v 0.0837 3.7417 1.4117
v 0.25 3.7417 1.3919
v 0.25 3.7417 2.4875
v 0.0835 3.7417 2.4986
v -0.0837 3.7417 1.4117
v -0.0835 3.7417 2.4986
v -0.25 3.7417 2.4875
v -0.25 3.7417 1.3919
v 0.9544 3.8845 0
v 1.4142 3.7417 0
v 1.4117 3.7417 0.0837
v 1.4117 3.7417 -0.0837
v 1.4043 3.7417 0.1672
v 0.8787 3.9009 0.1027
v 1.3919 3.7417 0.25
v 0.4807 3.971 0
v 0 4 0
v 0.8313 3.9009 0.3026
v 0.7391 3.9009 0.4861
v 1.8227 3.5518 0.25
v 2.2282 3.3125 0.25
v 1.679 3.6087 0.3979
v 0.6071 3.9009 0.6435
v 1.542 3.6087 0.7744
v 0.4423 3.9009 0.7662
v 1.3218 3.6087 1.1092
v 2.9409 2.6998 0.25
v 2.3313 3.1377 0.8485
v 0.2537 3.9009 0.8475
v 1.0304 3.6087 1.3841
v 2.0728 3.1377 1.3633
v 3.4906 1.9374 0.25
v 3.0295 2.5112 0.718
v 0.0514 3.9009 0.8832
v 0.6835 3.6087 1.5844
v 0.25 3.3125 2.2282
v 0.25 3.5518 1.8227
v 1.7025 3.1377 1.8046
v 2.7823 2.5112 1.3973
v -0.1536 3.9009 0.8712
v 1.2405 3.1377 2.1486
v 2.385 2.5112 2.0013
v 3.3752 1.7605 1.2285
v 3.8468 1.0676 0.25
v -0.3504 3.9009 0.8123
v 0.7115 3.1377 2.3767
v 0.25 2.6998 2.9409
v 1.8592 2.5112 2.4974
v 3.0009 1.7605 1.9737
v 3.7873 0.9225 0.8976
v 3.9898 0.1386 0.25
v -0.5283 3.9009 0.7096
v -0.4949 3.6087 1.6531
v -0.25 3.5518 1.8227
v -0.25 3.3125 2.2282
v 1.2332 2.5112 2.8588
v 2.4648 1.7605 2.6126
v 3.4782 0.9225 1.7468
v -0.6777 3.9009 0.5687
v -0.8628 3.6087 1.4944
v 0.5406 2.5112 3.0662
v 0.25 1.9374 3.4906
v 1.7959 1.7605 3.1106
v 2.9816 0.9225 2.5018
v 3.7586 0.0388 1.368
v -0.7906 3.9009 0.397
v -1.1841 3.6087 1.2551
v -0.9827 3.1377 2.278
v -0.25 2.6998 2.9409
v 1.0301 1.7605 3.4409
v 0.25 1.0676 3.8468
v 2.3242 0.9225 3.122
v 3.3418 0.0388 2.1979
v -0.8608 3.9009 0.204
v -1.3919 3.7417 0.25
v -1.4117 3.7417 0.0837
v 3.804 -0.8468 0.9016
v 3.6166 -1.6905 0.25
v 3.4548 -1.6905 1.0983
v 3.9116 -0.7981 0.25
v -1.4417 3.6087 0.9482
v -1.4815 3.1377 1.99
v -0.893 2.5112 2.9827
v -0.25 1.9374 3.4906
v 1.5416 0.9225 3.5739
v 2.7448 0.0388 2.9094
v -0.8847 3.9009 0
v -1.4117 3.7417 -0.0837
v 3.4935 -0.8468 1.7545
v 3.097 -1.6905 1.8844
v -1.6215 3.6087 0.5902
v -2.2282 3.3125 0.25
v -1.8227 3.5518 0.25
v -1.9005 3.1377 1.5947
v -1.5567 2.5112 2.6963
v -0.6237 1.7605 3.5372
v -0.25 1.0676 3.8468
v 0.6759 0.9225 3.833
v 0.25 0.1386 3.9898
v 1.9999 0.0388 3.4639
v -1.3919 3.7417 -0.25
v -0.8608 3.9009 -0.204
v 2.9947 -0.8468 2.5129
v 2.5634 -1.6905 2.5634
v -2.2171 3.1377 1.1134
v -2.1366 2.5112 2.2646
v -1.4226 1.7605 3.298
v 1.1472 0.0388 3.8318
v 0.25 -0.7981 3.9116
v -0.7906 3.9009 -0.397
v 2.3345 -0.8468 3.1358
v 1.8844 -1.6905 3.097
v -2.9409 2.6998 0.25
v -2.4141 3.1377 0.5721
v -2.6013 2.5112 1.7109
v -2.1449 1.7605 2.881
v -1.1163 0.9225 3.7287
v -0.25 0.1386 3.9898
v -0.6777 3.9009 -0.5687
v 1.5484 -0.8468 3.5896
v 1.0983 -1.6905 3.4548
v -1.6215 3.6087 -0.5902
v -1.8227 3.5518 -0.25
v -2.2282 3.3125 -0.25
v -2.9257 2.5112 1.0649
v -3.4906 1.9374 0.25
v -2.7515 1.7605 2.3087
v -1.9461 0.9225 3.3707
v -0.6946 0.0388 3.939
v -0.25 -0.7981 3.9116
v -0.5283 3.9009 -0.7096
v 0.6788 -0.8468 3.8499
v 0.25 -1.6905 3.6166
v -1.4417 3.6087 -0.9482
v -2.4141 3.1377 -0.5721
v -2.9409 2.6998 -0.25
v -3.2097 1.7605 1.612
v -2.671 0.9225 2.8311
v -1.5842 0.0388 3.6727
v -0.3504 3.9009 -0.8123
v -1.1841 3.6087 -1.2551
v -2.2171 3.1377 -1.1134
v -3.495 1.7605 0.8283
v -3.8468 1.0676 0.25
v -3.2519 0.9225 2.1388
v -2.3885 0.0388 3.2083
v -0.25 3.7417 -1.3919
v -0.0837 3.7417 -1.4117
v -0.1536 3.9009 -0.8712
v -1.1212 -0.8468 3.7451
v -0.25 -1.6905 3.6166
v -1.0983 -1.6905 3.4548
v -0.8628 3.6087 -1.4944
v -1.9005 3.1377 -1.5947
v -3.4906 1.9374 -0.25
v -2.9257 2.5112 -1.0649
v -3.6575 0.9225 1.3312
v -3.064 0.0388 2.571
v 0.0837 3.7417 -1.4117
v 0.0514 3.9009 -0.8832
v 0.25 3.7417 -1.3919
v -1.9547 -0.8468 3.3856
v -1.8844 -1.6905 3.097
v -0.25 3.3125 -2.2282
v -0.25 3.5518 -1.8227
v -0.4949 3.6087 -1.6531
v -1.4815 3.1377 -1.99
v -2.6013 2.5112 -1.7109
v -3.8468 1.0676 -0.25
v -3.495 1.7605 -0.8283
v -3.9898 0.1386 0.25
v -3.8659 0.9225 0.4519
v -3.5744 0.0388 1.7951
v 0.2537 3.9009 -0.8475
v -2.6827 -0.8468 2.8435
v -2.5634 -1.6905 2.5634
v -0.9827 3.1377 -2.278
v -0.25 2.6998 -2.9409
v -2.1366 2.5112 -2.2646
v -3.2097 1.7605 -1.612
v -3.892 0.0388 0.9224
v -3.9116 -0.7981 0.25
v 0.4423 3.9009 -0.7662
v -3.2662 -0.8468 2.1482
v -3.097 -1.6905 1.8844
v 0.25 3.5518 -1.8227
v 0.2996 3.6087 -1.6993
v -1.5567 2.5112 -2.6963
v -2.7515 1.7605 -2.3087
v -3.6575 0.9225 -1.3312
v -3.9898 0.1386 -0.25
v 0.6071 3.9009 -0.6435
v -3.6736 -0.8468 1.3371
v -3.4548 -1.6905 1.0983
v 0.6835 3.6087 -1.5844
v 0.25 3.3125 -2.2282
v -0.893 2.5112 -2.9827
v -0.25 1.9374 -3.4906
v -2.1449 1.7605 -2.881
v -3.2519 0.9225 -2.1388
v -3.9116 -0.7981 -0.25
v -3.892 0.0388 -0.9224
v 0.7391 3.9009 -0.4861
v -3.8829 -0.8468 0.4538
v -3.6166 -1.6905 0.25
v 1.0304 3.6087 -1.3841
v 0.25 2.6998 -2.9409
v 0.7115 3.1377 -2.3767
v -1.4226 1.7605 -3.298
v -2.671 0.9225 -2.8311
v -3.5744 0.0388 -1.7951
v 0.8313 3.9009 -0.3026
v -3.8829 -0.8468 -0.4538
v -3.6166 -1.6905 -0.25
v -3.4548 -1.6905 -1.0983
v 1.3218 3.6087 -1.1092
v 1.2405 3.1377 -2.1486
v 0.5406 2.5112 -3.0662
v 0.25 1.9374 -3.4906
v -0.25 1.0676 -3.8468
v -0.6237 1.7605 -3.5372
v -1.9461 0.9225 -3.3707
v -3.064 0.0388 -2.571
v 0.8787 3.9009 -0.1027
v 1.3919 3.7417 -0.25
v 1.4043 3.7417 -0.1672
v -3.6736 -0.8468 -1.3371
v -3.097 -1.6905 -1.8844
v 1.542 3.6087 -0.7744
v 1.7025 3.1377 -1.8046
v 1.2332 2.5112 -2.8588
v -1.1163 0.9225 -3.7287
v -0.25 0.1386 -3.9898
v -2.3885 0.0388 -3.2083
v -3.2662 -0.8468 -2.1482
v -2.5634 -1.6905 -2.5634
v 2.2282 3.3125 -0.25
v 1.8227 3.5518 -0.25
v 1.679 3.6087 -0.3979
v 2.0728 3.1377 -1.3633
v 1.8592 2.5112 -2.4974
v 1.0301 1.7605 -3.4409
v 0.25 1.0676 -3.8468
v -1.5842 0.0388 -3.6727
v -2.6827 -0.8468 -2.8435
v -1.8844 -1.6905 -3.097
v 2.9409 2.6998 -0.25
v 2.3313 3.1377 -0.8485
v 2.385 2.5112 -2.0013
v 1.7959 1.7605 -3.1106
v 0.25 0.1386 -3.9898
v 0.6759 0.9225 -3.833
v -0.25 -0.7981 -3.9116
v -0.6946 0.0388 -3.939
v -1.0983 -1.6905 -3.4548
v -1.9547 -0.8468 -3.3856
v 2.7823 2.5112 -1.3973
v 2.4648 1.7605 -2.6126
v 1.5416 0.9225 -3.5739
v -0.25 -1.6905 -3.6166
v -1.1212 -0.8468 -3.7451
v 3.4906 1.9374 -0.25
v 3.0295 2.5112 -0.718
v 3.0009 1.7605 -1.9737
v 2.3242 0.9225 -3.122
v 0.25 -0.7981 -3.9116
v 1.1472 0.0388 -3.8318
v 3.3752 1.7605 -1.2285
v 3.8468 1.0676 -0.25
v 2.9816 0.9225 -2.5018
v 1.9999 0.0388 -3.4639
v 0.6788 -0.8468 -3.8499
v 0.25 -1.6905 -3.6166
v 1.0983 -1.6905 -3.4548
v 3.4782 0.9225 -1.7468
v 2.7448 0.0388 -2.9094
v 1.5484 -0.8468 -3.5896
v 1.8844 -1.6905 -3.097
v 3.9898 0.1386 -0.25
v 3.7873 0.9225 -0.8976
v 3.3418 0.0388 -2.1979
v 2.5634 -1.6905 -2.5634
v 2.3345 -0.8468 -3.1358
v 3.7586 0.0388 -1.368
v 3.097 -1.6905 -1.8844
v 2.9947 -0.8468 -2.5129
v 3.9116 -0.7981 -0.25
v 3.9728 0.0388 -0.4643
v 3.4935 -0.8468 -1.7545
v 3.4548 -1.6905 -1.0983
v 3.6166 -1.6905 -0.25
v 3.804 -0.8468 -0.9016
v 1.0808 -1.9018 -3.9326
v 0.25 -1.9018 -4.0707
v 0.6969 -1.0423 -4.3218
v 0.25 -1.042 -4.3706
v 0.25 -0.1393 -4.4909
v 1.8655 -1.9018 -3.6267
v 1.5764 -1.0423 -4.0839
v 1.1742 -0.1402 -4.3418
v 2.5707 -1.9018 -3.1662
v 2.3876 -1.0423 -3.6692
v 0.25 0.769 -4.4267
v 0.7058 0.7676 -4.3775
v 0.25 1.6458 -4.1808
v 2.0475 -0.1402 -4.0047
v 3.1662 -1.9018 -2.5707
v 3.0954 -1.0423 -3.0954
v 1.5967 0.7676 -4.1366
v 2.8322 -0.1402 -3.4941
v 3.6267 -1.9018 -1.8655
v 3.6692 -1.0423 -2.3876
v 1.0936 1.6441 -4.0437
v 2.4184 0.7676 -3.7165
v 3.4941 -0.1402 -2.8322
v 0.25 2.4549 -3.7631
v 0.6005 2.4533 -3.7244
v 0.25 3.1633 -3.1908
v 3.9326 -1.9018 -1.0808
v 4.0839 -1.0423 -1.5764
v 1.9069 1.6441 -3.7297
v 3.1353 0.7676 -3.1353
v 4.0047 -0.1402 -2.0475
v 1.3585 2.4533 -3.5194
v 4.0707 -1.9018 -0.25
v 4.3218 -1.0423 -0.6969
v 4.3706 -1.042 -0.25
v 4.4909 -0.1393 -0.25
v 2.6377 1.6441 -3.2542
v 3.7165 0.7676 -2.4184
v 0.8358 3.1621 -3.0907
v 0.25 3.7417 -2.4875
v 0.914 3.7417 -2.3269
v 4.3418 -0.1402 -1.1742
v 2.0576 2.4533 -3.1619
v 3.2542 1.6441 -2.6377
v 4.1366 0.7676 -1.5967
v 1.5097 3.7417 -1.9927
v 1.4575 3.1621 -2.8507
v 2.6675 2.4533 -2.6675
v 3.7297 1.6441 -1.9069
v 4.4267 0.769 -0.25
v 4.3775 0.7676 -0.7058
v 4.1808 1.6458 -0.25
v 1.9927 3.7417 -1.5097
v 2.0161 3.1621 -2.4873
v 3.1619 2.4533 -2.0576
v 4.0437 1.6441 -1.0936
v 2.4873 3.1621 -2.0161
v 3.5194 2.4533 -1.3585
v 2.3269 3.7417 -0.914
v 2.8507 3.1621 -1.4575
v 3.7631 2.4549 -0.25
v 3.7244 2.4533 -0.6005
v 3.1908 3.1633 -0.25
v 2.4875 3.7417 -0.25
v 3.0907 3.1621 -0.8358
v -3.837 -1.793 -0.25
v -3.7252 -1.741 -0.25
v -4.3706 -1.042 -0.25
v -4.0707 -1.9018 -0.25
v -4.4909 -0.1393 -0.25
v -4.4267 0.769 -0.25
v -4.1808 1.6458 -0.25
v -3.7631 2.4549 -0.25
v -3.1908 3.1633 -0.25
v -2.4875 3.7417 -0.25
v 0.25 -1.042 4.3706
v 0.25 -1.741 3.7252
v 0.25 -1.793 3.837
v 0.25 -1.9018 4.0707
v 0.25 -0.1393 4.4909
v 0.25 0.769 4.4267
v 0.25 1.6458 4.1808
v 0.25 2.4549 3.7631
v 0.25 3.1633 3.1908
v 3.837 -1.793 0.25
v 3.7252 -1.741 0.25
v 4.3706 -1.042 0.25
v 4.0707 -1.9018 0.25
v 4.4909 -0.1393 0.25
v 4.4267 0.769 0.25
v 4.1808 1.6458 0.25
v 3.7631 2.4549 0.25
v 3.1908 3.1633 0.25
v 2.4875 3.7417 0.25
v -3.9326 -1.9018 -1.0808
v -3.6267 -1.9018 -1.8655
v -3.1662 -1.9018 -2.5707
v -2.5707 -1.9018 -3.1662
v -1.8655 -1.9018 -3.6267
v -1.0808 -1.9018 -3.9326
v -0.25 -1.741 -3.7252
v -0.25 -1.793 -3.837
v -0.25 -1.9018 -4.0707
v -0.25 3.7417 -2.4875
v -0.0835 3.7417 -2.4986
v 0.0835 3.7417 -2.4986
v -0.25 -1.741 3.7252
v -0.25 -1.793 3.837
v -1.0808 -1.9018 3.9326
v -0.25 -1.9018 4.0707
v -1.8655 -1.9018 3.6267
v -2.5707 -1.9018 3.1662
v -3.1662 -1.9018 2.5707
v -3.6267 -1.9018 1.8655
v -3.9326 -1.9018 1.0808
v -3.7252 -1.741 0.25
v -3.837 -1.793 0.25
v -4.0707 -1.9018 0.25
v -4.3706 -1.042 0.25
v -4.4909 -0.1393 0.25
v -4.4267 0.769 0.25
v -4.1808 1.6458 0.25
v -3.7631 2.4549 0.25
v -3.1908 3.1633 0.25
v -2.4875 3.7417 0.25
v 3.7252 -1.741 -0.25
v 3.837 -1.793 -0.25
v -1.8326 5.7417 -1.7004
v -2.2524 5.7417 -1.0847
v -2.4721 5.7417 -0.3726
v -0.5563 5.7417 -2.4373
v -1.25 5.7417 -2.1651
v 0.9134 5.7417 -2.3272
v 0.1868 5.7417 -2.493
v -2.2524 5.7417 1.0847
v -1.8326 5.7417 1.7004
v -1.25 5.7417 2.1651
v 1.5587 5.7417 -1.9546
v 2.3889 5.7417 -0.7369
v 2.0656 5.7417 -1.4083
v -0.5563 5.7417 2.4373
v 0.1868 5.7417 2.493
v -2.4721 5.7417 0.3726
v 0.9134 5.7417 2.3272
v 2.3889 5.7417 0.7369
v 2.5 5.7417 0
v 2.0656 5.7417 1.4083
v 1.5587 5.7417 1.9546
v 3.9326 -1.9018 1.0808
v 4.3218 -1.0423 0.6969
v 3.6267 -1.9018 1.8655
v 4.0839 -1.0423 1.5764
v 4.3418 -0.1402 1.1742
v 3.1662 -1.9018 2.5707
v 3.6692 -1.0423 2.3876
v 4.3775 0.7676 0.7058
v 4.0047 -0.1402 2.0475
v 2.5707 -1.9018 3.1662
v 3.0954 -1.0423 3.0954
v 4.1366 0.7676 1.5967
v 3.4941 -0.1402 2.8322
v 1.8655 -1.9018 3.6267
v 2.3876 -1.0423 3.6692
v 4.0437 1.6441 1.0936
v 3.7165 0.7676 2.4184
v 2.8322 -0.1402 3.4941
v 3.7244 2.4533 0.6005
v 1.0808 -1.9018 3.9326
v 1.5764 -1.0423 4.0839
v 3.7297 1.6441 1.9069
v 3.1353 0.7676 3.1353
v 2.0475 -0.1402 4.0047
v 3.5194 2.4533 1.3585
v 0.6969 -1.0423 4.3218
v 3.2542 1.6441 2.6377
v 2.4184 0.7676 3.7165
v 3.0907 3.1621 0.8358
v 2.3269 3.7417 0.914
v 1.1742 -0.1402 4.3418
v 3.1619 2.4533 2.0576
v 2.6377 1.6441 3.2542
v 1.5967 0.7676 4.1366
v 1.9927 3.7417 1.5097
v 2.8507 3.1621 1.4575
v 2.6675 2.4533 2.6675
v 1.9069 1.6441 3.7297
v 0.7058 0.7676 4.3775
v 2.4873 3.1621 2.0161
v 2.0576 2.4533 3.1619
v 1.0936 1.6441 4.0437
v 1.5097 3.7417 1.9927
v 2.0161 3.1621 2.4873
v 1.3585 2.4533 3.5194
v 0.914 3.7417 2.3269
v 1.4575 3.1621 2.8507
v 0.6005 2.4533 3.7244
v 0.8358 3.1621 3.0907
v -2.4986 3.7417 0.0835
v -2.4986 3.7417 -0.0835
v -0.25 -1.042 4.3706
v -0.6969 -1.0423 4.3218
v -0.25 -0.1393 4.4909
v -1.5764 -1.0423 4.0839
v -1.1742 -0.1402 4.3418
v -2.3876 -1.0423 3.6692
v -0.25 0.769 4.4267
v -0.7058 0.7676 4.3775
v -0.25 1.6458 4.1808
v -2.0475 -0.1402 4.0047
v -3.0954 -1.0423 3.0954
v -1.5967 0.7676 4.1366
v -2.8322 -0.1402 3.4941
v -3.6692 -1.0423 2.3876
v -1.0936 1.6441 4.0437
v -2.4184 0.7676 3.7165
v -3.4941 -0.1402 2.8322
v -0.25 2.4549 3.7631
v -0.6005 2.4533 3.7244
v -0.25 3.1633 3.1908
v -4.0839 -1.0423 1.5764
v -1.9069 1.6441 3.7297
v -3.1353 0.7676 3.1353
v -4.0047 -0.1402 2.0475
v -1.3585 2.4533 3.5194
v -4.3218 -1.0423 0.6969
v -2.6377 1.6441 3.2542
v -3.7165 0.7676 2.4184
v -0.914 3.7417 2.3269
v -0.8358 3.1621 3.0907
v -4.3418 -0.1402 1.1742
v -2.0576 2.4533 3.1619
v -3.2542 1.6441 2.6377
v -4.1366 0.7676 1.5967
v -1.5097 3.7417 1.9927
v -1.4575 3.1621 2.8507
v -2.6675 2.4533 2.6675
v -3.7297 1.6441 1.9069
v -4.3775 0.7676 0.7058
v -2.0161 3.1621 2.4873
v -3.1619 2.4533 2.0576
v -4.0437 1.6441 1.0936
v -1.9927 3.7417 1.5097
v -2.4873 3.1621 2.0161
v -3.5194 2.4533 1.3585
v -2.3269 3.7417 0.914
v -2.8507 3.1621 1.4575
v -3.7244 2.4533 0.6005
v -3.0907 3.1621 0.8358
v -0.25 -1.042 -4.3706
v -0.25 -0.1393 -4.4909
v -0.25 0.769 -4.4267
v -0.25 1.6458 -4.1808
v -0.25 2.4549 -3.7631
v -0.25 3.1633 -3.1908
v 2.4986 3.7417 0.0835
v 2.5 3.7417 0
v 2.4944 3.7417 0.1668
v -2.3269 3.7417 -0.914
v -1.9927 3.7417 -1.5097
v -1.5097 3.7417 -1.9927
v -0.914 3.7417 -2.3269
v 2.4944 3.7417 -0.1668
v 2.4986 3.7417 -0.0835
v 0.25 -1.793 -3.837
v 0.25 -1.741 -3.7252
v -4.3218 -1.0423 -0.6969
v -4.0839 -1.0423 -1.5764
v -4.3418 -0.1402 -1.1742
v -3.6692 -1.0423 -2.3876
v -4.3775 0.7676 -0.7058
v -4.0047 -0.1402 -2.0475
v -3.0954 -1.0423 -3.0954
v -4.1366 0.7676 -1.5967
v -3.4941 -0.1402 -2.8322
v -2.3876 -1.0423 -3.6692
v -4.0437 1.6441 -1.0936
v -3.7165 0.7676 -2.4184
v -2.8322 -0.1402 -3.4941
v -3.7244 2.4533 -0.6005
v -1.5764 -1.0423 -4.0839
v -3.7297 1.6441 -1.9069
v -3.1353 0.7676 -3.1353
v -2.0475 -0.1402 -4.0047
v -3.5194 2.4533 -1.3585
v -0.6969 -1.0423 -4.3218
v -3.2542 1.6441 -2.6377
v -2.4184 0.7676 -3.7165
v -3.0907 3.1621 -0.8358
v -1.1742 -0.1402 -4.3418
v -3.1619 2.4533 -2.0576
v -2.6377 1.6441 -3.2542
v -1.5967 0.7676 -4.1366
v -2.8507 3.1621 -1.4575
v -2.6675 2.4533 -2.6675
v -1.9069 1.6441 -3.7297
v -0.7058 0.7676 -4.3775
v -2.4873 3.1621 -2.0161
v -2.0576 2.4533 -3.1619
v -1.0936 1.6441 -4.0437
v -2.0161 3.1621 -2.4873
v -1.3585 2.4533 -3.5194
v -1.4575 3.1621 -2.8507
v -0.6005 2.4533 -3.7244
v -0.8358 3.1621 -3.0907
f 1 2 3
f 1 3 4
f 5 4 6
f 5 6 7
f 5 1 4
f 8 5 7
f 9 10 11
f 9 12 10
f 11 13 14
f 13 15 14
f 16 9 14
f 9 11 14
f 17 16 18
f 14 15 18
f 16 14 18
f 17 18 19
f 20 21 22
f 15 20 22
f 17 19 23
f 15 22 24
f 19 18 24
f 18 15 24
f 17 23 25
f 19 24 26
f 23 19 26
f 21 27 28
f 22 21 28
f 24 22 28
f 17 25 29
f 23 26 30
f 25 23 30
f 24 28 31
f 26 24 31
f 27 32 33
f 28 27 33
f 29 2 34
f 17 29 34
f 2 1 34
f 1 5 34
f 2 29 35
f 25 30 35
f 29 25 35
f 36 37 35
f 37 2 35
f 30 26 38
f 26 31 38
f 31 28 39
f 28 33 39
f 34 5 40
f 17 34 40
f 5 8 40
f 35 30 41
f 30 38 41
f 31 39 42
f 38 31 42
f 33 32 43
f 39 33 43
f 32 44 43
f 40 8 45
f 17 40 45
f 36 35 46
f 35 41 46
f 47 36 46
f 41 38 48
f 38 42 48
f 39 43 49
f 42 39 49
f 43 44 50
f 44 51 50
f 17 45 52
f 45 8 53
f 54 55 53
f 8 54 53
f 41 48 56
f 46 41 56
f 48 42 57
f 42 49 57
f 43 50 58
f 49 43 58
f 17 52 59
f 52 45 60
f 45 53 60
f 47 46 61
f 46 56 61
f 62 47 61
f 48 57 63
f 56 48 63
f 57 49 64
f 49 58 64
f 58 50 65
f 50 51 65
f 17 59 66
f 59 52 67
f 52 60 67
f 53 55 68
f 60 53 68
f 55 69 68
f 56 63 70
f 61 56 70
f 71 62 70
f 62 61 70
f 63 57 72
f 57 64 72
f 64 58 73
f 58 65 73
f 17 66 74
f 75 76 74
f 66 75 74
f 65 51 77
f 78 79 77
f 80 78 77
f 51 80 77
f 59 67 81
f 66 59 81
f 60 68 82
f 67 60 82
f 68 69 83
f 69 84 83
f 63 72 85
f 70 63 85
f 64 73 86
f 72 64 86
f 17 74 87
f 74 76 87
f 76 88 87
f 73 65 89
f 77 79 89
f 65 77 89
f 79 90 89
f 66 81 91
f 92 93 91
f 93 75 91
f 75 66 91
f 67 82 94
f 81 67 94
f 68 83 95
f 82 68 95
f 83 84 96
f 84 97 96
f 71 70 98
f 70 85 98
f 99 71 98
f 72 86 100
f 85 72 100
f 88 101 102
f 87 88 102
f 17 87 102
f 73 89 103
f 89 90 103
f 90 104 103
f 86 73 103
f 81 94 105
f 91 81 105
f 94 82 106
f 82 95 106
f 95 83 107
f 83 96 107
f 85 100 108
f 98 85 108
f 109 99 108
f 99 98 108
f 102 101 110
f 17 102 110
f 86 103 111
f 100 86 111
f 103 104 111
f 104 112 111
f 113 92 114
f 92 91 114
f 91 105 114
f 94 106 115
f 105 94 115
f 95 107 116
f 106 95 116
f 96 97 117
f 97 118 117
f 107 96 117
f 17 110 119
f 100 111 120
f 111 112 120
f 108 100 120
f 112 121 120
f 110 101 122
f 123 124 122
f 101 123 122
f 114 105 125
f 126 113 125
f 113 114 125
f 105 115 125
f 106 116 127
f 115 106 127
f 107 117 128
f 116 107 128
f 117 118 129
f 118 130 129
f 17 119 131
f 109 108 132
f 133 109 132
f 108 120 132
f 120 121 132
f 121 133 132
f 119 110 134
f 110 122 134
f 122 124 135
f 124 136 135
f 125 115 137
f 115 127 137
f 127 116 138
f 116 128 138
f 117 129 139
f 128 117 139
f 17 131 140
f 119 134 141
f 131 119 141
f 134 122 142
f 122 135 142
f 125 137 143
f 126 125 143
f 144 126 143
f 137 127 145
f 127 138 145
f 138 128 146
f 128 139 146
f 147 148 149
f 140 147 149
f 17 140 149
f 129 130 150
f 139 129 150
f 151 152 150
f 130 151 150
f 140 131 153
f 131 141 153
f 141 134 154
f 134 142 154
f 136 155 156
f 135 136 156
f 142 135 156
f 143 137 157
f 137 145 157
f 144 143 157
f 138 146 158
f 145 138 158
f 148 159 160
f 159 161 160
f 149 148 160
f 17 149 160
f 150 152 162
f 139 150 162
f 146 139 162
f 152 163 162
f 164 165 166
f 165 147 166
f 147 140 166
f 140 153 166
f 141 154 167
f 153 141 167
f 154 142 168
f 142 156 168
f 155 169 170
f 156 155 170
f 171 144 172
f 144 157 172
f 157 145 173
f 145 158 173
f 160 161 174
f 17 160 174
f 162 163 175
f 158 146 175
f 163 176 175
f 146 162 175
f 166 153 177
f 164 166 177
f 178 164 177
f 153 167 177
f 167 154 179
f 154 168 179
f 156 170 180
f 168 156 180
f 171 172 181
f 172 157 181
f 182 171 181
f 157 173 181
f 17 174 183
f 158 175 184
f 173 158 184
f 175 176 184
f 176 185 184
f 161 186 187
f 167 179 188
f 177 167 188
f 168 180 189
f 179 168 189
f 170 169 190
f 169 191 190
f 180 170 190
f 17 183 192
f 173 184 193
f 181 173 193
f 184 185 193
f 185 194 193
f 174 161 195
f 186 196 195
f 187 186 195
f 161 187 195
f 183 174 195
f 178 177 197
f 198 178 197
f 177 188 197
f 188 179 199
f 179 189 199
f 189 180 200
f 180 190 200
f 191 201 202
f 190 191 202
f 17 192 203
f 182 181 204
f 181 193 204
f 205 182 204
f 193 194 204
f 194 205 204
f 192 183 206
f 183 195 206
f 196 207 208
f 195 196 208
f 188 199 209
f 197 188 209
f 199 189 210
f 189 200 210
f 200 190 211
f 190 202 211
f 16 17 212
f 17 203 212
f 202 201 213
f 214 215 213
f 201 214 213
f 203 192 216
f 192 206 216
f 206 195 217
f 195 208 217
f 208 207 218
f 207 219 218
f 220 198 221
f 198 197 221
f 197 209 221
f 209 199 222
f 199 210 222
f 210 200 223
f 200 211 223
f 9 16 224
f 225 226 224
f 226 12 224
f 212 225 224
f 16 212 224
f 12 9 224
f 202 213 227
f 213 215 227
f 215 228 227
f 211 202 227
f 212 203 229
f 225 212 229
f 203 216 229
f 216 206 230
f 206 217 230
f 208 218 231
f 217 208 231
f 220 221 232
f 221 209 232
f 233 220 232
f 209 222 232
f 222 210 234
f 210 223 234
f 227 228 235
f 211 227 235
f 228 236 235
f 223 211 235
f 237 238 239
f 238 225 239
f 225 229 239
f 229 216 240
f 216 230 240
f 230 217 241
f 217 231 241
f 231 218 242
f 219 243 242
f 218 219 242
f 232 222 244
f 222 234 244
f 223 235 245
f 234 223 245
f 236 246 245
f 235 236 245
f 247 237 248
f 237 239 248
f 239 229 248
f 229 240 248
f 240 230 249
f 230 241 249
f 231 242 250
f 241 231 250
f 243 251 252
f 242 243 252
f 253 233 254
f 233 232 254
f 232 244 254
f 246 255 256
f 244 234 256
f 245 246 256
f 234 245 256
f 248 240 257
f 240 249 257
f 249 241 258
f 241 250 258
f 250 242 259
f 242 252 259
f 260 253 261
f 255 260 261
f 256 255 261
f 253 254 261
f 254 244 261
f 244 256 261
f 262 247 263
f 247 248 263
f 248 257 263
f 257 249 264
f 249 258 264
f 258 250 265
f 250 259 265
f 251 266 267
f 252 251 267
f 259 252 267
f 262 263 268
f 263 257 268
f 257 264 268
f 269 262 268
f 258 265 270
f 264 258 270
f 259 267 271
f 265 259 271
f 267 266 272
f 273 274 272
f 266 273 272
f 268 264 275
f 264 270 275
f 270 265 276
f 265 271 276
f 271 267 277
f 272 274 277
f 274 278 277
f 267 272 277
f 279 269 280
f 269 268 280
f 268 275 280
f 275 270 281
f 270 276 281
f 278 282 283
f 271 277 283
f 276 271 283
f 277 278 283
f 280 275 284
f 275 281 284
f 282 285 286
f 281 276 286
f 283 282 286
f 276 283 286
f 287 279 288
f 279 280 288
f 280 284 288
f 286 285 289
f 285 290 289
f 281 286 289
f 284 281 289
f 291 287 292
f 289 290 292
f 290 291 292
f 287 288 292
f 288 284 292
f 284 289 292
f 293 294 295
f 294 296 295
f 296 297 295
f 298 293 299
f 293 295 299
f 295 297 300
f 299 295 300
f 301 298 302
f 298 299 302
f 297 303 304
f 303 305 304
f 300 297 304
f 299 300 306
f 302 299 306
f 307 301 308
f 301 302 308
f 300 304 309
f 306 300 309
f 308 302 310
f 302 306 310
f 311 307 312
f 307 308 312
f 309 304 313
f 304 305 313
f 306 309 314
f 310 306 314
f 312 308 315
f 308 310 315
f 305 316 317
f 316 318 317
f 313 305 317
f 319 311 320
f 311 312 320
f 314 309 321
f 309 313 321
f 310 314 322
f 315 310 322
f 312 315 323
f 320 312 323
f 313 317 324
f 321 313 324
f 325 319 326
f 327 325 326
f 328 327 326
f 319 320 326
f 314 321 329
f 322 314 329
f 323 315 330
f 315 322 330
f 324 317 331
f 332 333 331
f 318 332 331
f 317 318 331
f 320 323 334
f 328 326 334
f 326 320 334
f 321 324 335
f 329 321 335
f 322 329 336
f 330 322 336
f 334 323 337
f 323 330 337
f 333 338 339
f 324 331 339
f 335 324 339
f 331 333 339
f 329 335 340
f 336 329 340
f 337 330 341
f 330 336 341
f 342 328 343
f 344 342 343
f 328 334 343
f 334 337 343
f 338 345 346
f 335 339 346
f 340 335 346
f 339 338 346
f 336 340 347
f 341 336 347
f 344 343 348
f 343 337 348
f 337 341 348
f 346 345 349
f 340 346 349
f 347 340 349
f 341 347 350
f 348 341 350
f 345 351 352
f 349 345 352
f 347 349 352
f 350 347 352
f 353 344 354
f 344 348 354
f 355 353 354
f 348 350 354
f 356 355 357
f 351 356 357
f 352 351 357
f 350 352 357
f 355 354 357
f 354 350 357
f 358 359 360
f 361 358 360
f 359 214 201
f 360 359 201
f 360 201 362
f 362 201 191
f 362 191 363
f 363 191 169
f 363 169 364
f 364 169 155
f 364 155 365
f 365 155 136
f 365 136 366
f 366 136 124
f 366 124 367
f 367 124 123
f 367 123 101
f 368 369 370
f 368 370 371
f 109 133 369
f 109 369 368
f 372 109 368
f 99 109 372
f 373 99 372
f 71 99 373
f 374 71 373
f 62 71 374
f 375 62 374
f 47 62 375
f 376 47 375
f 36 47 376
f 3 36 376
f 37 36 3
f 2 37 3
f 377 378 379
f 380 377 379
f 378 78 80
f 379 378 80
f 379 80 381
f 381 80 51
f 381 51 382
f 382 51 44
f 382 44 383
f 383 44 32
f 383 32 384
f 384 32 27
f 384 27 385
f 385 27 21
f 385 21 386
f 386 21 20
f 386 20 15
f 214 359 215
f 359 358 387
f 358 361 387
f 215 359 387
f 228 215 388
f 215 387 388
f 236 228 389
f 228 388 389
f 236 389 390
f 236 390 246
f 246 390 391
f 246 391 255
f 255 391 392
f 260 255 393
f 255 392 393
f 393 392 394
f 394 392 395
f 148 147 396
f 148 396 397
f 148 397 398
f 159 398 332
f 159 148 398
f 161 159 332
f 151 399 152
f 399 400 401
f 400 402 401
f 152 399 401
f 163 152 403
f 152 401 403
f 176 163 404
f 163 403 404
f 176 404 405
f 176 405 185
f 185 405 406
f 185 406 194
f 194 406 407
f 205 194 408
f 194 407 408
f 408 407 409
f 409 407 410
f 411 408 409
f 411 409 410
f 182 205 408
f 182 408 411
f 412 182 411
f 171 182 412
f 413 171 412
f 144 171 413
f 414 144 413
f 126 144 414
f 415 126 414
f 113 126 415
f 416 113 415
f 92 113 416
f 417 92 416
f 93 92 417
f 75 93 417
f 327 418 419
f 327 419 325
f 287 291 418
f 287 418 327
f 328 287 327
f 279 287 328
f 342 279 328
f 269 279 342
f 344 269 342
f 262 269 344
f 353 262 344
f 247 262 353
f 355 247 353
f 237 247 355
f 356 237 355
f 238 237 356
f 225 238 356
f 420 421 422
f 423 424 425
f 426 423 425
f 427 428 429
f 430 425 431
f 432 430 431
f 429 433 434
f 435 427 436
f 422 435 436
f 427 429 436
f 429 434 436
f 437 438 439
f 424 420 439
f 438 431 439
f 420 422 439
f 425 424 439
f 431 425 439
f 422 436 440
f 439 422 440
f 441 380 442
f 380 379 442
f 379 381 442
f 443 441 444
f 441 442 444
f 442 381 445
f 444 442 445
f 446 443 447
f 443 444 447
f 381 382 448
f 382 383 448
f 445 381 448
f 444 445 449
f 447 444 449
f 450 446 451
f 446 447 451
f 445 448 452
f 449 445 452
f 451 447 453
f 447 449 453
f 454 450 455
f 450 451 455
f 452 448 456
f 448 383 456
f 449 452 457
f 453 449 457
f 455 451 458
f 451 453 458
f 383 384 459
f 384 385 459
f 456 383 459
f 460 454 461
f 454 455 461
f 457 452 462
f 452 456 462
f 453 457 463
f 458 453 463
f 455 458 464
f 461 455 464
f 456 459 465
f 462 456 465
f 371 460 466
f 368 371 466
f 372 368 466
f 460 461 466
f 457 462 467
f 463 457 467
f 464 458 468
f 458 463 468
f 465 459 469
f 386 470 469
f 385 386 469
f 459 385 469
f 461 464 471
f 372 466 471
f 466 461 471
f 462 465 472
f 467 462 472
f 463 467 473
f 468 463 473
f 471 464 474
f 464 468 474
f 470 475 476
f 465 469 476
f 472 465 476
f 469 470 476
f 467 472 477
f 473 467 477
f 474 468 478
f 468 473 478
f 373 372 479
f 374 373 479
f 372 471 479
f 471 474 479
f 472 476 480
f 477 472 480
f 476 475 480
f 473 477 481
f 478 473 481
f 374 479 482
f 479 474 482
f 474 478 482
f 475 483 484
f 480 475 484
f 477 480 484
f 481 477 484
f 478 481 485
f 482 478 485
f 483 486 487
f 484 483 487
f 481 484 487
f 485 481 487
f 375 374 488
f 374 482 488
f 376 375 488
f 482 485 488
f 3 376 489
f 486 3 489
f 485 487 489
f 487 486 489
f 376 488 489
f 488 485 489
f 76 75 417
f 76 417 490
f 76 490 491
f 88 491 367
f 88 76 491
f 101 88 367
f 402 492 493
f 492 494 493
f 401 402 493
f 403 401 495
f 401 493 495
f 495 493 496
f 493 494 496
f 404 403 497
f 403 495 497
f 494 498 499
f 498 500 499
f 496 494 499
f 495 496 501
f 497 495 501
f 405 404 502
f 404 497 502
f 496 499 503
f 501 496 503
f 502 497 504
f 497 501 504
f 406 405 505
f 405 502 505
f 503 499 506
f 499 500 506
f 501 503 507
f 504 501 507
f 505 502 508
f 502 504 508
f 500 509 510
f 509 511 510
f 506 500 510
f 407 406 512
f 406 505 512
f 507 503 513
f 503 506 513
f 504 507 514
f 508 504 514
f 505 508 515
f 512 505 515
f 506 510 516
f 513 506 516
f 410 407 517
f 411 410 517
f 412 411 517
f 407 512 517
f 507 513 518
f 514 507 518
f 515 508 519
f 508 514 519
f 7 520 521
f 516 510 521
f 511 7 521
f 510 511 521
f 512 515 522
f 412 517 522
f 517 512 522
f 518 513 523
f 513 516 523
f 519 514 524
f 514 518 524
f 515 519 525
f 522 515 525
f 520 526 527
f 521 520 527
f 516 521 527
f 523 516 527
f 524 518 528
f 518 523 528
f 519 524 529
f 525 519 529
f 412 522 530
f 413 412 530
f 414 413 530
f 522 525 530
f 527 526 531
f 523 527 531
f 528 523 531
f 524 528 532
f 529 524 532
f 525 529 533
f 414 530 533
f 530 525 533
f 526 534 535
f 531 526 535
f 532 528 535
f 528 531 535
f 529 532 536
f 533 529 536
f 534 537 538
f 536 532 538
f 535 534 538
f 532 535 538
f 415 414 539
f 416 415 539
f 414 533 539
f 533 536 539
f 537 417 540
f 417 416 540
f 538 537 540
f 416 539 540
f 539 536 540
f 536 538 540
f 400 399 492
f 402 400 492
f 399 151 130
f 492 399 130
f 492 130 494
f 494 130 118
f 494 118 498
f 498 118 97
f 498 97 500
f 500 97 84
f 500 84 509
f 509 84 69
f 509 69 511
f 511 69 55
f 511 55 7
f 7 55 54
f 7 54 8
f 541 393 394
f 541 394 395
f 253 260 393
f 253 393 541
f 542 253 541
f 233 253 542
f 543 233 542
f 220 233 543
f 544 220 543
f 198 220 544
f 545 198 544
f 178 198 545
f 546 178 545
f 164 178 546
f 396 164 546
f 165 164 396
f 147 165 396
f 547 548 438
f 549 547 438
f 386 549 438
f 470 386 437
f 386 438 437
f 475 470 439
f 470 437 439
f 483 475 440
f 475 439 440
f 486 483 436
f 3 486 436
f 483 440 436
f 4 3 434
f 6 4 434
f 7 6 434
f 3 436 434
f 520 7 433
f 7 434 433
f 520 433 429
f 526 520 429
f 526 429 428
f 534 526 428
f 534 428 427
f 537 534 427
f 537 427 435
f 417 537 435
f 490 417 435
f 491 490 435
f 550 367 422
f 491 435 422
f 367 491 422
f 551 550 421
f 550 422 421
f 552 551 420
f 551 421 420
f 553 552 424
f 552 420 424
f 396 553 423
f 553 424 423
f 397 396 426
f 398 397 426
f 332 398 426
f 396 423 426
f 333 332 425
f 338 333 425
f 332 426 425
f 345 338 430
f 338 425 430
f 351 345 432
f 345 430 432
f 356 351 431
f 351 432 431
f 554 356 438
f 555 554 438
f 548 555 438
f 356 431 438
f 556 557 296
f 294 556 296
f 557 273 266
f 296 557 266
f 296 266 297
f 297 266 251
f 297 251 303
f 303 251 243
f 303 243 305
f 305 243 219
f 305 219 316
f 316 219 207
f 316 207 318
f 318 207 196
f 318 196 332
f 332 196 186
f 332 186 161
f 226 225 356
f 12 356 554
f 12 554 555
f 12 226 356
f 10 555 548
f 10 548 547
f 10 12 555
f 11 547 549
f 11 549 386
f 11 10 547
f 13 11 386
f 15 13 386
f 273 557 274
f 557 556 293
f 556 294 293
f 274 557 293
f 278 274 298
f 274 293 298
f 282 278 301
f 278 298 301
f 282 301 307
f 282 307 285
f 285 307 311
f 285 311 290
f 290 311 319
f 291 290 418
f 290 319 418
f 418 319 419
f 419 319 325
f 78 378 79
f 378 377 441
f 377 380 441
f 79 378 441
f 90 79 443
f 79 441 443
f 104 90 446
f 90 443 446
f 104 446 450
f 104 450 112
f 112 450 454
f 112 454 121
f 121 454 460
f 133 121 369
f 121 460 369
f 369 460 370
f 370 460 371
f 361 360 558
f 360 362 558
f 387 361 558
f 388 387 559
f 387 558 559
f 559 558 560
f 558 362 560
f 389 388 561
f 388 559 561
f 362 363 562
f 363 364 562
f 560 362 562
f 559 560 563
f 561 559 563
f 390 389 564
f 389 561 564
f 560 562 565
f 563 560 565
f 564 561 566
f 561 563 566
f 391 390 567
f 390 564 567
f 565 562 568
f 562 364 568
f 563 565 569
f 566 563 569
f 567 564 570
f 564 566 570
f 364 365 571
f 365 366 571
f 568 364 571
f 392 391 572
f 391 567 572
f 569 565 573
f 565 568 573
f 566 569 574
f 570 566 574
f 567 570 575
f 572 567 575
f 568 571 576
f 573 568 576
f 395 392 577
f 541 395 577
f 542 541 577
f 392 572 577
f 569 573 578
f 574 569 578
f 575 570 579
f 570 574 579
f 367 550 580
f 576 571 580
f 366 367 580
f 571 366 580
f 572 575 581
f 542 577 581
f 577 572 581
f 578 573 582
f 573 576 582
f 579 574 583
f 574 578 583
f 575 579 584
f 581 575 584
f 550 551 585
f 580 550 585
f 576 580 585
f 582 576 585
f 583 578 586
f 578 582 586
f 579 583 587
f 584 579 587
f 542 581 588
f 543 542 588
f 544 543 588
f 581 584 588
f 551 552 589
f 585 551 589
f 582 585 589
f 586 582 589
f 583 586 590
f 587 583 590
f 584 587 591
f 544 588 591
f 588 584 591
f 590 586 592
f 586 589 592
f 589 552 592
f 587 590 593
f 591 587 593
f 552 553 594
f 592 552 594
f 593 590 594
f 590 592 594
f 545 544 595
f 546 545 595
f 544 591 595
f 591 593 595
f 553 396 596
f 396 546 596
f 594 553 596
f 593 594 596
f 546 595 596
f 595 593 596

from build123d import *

# Parameters (mm, degrees)
SKETCH2_W          = 0.5
SKETCH2_H          = 5.643439565
CUT_EXTRUDE1_DEPTH = 10
CIRPATTERN1_COUNT  = 4


with BuildPart() as part:
    # Sketch1 → Revolve1 (revolve)
    with BuildSketch(Plane.XY):
        with BuildLine():
            Line((0, 5.741657387), (0, 4))
            ThreePointArc((0, 4), (3.373565783, 2.149198433), (3.625231148, -1.690473047))
            Line((3.625231148, -1.690473047), (4.078385042, -1.901782178))
            ThreePointArc((4.078385042, -1.901782178), (4.333692417, 1.212068493), (2.5, 3.741657387))
            Line((2.5, 3.741657387), (2.5, 5.741657387))
            Line((2.5, 5.741657387), (0, 5.741657387))
        make_face()
    revolve(axis=Axis((0, 5.741657387, 0), (0, -1, 0)))

    # Sketch2 → Cut-Extrude1 (cut)
    with BuildSketch(Plane.XY):
        with Locations((0, 0.919937604)):
            Rectangle(SKETCH2_W, SKETCH2_H)
    cut_extrude1 = extrude(amount=-CUT_EXTRUDE1_DEPTH, mode=Mode.SUBTRACT)

    # CirPattern1: Cut-Extrude1 ×4 about axis
    cirpattern1_axis = Axis((0, 0, 0), (0, 1, 0))
    for i in range(1, CIRPATTERN1_COUNT):
        add(cut_extrude1.rotate(cirpattern1_axis, i * 360 / CIRPATTERN1_COUNT), mode=Mode.SUBTRACT)


solid = part.part
